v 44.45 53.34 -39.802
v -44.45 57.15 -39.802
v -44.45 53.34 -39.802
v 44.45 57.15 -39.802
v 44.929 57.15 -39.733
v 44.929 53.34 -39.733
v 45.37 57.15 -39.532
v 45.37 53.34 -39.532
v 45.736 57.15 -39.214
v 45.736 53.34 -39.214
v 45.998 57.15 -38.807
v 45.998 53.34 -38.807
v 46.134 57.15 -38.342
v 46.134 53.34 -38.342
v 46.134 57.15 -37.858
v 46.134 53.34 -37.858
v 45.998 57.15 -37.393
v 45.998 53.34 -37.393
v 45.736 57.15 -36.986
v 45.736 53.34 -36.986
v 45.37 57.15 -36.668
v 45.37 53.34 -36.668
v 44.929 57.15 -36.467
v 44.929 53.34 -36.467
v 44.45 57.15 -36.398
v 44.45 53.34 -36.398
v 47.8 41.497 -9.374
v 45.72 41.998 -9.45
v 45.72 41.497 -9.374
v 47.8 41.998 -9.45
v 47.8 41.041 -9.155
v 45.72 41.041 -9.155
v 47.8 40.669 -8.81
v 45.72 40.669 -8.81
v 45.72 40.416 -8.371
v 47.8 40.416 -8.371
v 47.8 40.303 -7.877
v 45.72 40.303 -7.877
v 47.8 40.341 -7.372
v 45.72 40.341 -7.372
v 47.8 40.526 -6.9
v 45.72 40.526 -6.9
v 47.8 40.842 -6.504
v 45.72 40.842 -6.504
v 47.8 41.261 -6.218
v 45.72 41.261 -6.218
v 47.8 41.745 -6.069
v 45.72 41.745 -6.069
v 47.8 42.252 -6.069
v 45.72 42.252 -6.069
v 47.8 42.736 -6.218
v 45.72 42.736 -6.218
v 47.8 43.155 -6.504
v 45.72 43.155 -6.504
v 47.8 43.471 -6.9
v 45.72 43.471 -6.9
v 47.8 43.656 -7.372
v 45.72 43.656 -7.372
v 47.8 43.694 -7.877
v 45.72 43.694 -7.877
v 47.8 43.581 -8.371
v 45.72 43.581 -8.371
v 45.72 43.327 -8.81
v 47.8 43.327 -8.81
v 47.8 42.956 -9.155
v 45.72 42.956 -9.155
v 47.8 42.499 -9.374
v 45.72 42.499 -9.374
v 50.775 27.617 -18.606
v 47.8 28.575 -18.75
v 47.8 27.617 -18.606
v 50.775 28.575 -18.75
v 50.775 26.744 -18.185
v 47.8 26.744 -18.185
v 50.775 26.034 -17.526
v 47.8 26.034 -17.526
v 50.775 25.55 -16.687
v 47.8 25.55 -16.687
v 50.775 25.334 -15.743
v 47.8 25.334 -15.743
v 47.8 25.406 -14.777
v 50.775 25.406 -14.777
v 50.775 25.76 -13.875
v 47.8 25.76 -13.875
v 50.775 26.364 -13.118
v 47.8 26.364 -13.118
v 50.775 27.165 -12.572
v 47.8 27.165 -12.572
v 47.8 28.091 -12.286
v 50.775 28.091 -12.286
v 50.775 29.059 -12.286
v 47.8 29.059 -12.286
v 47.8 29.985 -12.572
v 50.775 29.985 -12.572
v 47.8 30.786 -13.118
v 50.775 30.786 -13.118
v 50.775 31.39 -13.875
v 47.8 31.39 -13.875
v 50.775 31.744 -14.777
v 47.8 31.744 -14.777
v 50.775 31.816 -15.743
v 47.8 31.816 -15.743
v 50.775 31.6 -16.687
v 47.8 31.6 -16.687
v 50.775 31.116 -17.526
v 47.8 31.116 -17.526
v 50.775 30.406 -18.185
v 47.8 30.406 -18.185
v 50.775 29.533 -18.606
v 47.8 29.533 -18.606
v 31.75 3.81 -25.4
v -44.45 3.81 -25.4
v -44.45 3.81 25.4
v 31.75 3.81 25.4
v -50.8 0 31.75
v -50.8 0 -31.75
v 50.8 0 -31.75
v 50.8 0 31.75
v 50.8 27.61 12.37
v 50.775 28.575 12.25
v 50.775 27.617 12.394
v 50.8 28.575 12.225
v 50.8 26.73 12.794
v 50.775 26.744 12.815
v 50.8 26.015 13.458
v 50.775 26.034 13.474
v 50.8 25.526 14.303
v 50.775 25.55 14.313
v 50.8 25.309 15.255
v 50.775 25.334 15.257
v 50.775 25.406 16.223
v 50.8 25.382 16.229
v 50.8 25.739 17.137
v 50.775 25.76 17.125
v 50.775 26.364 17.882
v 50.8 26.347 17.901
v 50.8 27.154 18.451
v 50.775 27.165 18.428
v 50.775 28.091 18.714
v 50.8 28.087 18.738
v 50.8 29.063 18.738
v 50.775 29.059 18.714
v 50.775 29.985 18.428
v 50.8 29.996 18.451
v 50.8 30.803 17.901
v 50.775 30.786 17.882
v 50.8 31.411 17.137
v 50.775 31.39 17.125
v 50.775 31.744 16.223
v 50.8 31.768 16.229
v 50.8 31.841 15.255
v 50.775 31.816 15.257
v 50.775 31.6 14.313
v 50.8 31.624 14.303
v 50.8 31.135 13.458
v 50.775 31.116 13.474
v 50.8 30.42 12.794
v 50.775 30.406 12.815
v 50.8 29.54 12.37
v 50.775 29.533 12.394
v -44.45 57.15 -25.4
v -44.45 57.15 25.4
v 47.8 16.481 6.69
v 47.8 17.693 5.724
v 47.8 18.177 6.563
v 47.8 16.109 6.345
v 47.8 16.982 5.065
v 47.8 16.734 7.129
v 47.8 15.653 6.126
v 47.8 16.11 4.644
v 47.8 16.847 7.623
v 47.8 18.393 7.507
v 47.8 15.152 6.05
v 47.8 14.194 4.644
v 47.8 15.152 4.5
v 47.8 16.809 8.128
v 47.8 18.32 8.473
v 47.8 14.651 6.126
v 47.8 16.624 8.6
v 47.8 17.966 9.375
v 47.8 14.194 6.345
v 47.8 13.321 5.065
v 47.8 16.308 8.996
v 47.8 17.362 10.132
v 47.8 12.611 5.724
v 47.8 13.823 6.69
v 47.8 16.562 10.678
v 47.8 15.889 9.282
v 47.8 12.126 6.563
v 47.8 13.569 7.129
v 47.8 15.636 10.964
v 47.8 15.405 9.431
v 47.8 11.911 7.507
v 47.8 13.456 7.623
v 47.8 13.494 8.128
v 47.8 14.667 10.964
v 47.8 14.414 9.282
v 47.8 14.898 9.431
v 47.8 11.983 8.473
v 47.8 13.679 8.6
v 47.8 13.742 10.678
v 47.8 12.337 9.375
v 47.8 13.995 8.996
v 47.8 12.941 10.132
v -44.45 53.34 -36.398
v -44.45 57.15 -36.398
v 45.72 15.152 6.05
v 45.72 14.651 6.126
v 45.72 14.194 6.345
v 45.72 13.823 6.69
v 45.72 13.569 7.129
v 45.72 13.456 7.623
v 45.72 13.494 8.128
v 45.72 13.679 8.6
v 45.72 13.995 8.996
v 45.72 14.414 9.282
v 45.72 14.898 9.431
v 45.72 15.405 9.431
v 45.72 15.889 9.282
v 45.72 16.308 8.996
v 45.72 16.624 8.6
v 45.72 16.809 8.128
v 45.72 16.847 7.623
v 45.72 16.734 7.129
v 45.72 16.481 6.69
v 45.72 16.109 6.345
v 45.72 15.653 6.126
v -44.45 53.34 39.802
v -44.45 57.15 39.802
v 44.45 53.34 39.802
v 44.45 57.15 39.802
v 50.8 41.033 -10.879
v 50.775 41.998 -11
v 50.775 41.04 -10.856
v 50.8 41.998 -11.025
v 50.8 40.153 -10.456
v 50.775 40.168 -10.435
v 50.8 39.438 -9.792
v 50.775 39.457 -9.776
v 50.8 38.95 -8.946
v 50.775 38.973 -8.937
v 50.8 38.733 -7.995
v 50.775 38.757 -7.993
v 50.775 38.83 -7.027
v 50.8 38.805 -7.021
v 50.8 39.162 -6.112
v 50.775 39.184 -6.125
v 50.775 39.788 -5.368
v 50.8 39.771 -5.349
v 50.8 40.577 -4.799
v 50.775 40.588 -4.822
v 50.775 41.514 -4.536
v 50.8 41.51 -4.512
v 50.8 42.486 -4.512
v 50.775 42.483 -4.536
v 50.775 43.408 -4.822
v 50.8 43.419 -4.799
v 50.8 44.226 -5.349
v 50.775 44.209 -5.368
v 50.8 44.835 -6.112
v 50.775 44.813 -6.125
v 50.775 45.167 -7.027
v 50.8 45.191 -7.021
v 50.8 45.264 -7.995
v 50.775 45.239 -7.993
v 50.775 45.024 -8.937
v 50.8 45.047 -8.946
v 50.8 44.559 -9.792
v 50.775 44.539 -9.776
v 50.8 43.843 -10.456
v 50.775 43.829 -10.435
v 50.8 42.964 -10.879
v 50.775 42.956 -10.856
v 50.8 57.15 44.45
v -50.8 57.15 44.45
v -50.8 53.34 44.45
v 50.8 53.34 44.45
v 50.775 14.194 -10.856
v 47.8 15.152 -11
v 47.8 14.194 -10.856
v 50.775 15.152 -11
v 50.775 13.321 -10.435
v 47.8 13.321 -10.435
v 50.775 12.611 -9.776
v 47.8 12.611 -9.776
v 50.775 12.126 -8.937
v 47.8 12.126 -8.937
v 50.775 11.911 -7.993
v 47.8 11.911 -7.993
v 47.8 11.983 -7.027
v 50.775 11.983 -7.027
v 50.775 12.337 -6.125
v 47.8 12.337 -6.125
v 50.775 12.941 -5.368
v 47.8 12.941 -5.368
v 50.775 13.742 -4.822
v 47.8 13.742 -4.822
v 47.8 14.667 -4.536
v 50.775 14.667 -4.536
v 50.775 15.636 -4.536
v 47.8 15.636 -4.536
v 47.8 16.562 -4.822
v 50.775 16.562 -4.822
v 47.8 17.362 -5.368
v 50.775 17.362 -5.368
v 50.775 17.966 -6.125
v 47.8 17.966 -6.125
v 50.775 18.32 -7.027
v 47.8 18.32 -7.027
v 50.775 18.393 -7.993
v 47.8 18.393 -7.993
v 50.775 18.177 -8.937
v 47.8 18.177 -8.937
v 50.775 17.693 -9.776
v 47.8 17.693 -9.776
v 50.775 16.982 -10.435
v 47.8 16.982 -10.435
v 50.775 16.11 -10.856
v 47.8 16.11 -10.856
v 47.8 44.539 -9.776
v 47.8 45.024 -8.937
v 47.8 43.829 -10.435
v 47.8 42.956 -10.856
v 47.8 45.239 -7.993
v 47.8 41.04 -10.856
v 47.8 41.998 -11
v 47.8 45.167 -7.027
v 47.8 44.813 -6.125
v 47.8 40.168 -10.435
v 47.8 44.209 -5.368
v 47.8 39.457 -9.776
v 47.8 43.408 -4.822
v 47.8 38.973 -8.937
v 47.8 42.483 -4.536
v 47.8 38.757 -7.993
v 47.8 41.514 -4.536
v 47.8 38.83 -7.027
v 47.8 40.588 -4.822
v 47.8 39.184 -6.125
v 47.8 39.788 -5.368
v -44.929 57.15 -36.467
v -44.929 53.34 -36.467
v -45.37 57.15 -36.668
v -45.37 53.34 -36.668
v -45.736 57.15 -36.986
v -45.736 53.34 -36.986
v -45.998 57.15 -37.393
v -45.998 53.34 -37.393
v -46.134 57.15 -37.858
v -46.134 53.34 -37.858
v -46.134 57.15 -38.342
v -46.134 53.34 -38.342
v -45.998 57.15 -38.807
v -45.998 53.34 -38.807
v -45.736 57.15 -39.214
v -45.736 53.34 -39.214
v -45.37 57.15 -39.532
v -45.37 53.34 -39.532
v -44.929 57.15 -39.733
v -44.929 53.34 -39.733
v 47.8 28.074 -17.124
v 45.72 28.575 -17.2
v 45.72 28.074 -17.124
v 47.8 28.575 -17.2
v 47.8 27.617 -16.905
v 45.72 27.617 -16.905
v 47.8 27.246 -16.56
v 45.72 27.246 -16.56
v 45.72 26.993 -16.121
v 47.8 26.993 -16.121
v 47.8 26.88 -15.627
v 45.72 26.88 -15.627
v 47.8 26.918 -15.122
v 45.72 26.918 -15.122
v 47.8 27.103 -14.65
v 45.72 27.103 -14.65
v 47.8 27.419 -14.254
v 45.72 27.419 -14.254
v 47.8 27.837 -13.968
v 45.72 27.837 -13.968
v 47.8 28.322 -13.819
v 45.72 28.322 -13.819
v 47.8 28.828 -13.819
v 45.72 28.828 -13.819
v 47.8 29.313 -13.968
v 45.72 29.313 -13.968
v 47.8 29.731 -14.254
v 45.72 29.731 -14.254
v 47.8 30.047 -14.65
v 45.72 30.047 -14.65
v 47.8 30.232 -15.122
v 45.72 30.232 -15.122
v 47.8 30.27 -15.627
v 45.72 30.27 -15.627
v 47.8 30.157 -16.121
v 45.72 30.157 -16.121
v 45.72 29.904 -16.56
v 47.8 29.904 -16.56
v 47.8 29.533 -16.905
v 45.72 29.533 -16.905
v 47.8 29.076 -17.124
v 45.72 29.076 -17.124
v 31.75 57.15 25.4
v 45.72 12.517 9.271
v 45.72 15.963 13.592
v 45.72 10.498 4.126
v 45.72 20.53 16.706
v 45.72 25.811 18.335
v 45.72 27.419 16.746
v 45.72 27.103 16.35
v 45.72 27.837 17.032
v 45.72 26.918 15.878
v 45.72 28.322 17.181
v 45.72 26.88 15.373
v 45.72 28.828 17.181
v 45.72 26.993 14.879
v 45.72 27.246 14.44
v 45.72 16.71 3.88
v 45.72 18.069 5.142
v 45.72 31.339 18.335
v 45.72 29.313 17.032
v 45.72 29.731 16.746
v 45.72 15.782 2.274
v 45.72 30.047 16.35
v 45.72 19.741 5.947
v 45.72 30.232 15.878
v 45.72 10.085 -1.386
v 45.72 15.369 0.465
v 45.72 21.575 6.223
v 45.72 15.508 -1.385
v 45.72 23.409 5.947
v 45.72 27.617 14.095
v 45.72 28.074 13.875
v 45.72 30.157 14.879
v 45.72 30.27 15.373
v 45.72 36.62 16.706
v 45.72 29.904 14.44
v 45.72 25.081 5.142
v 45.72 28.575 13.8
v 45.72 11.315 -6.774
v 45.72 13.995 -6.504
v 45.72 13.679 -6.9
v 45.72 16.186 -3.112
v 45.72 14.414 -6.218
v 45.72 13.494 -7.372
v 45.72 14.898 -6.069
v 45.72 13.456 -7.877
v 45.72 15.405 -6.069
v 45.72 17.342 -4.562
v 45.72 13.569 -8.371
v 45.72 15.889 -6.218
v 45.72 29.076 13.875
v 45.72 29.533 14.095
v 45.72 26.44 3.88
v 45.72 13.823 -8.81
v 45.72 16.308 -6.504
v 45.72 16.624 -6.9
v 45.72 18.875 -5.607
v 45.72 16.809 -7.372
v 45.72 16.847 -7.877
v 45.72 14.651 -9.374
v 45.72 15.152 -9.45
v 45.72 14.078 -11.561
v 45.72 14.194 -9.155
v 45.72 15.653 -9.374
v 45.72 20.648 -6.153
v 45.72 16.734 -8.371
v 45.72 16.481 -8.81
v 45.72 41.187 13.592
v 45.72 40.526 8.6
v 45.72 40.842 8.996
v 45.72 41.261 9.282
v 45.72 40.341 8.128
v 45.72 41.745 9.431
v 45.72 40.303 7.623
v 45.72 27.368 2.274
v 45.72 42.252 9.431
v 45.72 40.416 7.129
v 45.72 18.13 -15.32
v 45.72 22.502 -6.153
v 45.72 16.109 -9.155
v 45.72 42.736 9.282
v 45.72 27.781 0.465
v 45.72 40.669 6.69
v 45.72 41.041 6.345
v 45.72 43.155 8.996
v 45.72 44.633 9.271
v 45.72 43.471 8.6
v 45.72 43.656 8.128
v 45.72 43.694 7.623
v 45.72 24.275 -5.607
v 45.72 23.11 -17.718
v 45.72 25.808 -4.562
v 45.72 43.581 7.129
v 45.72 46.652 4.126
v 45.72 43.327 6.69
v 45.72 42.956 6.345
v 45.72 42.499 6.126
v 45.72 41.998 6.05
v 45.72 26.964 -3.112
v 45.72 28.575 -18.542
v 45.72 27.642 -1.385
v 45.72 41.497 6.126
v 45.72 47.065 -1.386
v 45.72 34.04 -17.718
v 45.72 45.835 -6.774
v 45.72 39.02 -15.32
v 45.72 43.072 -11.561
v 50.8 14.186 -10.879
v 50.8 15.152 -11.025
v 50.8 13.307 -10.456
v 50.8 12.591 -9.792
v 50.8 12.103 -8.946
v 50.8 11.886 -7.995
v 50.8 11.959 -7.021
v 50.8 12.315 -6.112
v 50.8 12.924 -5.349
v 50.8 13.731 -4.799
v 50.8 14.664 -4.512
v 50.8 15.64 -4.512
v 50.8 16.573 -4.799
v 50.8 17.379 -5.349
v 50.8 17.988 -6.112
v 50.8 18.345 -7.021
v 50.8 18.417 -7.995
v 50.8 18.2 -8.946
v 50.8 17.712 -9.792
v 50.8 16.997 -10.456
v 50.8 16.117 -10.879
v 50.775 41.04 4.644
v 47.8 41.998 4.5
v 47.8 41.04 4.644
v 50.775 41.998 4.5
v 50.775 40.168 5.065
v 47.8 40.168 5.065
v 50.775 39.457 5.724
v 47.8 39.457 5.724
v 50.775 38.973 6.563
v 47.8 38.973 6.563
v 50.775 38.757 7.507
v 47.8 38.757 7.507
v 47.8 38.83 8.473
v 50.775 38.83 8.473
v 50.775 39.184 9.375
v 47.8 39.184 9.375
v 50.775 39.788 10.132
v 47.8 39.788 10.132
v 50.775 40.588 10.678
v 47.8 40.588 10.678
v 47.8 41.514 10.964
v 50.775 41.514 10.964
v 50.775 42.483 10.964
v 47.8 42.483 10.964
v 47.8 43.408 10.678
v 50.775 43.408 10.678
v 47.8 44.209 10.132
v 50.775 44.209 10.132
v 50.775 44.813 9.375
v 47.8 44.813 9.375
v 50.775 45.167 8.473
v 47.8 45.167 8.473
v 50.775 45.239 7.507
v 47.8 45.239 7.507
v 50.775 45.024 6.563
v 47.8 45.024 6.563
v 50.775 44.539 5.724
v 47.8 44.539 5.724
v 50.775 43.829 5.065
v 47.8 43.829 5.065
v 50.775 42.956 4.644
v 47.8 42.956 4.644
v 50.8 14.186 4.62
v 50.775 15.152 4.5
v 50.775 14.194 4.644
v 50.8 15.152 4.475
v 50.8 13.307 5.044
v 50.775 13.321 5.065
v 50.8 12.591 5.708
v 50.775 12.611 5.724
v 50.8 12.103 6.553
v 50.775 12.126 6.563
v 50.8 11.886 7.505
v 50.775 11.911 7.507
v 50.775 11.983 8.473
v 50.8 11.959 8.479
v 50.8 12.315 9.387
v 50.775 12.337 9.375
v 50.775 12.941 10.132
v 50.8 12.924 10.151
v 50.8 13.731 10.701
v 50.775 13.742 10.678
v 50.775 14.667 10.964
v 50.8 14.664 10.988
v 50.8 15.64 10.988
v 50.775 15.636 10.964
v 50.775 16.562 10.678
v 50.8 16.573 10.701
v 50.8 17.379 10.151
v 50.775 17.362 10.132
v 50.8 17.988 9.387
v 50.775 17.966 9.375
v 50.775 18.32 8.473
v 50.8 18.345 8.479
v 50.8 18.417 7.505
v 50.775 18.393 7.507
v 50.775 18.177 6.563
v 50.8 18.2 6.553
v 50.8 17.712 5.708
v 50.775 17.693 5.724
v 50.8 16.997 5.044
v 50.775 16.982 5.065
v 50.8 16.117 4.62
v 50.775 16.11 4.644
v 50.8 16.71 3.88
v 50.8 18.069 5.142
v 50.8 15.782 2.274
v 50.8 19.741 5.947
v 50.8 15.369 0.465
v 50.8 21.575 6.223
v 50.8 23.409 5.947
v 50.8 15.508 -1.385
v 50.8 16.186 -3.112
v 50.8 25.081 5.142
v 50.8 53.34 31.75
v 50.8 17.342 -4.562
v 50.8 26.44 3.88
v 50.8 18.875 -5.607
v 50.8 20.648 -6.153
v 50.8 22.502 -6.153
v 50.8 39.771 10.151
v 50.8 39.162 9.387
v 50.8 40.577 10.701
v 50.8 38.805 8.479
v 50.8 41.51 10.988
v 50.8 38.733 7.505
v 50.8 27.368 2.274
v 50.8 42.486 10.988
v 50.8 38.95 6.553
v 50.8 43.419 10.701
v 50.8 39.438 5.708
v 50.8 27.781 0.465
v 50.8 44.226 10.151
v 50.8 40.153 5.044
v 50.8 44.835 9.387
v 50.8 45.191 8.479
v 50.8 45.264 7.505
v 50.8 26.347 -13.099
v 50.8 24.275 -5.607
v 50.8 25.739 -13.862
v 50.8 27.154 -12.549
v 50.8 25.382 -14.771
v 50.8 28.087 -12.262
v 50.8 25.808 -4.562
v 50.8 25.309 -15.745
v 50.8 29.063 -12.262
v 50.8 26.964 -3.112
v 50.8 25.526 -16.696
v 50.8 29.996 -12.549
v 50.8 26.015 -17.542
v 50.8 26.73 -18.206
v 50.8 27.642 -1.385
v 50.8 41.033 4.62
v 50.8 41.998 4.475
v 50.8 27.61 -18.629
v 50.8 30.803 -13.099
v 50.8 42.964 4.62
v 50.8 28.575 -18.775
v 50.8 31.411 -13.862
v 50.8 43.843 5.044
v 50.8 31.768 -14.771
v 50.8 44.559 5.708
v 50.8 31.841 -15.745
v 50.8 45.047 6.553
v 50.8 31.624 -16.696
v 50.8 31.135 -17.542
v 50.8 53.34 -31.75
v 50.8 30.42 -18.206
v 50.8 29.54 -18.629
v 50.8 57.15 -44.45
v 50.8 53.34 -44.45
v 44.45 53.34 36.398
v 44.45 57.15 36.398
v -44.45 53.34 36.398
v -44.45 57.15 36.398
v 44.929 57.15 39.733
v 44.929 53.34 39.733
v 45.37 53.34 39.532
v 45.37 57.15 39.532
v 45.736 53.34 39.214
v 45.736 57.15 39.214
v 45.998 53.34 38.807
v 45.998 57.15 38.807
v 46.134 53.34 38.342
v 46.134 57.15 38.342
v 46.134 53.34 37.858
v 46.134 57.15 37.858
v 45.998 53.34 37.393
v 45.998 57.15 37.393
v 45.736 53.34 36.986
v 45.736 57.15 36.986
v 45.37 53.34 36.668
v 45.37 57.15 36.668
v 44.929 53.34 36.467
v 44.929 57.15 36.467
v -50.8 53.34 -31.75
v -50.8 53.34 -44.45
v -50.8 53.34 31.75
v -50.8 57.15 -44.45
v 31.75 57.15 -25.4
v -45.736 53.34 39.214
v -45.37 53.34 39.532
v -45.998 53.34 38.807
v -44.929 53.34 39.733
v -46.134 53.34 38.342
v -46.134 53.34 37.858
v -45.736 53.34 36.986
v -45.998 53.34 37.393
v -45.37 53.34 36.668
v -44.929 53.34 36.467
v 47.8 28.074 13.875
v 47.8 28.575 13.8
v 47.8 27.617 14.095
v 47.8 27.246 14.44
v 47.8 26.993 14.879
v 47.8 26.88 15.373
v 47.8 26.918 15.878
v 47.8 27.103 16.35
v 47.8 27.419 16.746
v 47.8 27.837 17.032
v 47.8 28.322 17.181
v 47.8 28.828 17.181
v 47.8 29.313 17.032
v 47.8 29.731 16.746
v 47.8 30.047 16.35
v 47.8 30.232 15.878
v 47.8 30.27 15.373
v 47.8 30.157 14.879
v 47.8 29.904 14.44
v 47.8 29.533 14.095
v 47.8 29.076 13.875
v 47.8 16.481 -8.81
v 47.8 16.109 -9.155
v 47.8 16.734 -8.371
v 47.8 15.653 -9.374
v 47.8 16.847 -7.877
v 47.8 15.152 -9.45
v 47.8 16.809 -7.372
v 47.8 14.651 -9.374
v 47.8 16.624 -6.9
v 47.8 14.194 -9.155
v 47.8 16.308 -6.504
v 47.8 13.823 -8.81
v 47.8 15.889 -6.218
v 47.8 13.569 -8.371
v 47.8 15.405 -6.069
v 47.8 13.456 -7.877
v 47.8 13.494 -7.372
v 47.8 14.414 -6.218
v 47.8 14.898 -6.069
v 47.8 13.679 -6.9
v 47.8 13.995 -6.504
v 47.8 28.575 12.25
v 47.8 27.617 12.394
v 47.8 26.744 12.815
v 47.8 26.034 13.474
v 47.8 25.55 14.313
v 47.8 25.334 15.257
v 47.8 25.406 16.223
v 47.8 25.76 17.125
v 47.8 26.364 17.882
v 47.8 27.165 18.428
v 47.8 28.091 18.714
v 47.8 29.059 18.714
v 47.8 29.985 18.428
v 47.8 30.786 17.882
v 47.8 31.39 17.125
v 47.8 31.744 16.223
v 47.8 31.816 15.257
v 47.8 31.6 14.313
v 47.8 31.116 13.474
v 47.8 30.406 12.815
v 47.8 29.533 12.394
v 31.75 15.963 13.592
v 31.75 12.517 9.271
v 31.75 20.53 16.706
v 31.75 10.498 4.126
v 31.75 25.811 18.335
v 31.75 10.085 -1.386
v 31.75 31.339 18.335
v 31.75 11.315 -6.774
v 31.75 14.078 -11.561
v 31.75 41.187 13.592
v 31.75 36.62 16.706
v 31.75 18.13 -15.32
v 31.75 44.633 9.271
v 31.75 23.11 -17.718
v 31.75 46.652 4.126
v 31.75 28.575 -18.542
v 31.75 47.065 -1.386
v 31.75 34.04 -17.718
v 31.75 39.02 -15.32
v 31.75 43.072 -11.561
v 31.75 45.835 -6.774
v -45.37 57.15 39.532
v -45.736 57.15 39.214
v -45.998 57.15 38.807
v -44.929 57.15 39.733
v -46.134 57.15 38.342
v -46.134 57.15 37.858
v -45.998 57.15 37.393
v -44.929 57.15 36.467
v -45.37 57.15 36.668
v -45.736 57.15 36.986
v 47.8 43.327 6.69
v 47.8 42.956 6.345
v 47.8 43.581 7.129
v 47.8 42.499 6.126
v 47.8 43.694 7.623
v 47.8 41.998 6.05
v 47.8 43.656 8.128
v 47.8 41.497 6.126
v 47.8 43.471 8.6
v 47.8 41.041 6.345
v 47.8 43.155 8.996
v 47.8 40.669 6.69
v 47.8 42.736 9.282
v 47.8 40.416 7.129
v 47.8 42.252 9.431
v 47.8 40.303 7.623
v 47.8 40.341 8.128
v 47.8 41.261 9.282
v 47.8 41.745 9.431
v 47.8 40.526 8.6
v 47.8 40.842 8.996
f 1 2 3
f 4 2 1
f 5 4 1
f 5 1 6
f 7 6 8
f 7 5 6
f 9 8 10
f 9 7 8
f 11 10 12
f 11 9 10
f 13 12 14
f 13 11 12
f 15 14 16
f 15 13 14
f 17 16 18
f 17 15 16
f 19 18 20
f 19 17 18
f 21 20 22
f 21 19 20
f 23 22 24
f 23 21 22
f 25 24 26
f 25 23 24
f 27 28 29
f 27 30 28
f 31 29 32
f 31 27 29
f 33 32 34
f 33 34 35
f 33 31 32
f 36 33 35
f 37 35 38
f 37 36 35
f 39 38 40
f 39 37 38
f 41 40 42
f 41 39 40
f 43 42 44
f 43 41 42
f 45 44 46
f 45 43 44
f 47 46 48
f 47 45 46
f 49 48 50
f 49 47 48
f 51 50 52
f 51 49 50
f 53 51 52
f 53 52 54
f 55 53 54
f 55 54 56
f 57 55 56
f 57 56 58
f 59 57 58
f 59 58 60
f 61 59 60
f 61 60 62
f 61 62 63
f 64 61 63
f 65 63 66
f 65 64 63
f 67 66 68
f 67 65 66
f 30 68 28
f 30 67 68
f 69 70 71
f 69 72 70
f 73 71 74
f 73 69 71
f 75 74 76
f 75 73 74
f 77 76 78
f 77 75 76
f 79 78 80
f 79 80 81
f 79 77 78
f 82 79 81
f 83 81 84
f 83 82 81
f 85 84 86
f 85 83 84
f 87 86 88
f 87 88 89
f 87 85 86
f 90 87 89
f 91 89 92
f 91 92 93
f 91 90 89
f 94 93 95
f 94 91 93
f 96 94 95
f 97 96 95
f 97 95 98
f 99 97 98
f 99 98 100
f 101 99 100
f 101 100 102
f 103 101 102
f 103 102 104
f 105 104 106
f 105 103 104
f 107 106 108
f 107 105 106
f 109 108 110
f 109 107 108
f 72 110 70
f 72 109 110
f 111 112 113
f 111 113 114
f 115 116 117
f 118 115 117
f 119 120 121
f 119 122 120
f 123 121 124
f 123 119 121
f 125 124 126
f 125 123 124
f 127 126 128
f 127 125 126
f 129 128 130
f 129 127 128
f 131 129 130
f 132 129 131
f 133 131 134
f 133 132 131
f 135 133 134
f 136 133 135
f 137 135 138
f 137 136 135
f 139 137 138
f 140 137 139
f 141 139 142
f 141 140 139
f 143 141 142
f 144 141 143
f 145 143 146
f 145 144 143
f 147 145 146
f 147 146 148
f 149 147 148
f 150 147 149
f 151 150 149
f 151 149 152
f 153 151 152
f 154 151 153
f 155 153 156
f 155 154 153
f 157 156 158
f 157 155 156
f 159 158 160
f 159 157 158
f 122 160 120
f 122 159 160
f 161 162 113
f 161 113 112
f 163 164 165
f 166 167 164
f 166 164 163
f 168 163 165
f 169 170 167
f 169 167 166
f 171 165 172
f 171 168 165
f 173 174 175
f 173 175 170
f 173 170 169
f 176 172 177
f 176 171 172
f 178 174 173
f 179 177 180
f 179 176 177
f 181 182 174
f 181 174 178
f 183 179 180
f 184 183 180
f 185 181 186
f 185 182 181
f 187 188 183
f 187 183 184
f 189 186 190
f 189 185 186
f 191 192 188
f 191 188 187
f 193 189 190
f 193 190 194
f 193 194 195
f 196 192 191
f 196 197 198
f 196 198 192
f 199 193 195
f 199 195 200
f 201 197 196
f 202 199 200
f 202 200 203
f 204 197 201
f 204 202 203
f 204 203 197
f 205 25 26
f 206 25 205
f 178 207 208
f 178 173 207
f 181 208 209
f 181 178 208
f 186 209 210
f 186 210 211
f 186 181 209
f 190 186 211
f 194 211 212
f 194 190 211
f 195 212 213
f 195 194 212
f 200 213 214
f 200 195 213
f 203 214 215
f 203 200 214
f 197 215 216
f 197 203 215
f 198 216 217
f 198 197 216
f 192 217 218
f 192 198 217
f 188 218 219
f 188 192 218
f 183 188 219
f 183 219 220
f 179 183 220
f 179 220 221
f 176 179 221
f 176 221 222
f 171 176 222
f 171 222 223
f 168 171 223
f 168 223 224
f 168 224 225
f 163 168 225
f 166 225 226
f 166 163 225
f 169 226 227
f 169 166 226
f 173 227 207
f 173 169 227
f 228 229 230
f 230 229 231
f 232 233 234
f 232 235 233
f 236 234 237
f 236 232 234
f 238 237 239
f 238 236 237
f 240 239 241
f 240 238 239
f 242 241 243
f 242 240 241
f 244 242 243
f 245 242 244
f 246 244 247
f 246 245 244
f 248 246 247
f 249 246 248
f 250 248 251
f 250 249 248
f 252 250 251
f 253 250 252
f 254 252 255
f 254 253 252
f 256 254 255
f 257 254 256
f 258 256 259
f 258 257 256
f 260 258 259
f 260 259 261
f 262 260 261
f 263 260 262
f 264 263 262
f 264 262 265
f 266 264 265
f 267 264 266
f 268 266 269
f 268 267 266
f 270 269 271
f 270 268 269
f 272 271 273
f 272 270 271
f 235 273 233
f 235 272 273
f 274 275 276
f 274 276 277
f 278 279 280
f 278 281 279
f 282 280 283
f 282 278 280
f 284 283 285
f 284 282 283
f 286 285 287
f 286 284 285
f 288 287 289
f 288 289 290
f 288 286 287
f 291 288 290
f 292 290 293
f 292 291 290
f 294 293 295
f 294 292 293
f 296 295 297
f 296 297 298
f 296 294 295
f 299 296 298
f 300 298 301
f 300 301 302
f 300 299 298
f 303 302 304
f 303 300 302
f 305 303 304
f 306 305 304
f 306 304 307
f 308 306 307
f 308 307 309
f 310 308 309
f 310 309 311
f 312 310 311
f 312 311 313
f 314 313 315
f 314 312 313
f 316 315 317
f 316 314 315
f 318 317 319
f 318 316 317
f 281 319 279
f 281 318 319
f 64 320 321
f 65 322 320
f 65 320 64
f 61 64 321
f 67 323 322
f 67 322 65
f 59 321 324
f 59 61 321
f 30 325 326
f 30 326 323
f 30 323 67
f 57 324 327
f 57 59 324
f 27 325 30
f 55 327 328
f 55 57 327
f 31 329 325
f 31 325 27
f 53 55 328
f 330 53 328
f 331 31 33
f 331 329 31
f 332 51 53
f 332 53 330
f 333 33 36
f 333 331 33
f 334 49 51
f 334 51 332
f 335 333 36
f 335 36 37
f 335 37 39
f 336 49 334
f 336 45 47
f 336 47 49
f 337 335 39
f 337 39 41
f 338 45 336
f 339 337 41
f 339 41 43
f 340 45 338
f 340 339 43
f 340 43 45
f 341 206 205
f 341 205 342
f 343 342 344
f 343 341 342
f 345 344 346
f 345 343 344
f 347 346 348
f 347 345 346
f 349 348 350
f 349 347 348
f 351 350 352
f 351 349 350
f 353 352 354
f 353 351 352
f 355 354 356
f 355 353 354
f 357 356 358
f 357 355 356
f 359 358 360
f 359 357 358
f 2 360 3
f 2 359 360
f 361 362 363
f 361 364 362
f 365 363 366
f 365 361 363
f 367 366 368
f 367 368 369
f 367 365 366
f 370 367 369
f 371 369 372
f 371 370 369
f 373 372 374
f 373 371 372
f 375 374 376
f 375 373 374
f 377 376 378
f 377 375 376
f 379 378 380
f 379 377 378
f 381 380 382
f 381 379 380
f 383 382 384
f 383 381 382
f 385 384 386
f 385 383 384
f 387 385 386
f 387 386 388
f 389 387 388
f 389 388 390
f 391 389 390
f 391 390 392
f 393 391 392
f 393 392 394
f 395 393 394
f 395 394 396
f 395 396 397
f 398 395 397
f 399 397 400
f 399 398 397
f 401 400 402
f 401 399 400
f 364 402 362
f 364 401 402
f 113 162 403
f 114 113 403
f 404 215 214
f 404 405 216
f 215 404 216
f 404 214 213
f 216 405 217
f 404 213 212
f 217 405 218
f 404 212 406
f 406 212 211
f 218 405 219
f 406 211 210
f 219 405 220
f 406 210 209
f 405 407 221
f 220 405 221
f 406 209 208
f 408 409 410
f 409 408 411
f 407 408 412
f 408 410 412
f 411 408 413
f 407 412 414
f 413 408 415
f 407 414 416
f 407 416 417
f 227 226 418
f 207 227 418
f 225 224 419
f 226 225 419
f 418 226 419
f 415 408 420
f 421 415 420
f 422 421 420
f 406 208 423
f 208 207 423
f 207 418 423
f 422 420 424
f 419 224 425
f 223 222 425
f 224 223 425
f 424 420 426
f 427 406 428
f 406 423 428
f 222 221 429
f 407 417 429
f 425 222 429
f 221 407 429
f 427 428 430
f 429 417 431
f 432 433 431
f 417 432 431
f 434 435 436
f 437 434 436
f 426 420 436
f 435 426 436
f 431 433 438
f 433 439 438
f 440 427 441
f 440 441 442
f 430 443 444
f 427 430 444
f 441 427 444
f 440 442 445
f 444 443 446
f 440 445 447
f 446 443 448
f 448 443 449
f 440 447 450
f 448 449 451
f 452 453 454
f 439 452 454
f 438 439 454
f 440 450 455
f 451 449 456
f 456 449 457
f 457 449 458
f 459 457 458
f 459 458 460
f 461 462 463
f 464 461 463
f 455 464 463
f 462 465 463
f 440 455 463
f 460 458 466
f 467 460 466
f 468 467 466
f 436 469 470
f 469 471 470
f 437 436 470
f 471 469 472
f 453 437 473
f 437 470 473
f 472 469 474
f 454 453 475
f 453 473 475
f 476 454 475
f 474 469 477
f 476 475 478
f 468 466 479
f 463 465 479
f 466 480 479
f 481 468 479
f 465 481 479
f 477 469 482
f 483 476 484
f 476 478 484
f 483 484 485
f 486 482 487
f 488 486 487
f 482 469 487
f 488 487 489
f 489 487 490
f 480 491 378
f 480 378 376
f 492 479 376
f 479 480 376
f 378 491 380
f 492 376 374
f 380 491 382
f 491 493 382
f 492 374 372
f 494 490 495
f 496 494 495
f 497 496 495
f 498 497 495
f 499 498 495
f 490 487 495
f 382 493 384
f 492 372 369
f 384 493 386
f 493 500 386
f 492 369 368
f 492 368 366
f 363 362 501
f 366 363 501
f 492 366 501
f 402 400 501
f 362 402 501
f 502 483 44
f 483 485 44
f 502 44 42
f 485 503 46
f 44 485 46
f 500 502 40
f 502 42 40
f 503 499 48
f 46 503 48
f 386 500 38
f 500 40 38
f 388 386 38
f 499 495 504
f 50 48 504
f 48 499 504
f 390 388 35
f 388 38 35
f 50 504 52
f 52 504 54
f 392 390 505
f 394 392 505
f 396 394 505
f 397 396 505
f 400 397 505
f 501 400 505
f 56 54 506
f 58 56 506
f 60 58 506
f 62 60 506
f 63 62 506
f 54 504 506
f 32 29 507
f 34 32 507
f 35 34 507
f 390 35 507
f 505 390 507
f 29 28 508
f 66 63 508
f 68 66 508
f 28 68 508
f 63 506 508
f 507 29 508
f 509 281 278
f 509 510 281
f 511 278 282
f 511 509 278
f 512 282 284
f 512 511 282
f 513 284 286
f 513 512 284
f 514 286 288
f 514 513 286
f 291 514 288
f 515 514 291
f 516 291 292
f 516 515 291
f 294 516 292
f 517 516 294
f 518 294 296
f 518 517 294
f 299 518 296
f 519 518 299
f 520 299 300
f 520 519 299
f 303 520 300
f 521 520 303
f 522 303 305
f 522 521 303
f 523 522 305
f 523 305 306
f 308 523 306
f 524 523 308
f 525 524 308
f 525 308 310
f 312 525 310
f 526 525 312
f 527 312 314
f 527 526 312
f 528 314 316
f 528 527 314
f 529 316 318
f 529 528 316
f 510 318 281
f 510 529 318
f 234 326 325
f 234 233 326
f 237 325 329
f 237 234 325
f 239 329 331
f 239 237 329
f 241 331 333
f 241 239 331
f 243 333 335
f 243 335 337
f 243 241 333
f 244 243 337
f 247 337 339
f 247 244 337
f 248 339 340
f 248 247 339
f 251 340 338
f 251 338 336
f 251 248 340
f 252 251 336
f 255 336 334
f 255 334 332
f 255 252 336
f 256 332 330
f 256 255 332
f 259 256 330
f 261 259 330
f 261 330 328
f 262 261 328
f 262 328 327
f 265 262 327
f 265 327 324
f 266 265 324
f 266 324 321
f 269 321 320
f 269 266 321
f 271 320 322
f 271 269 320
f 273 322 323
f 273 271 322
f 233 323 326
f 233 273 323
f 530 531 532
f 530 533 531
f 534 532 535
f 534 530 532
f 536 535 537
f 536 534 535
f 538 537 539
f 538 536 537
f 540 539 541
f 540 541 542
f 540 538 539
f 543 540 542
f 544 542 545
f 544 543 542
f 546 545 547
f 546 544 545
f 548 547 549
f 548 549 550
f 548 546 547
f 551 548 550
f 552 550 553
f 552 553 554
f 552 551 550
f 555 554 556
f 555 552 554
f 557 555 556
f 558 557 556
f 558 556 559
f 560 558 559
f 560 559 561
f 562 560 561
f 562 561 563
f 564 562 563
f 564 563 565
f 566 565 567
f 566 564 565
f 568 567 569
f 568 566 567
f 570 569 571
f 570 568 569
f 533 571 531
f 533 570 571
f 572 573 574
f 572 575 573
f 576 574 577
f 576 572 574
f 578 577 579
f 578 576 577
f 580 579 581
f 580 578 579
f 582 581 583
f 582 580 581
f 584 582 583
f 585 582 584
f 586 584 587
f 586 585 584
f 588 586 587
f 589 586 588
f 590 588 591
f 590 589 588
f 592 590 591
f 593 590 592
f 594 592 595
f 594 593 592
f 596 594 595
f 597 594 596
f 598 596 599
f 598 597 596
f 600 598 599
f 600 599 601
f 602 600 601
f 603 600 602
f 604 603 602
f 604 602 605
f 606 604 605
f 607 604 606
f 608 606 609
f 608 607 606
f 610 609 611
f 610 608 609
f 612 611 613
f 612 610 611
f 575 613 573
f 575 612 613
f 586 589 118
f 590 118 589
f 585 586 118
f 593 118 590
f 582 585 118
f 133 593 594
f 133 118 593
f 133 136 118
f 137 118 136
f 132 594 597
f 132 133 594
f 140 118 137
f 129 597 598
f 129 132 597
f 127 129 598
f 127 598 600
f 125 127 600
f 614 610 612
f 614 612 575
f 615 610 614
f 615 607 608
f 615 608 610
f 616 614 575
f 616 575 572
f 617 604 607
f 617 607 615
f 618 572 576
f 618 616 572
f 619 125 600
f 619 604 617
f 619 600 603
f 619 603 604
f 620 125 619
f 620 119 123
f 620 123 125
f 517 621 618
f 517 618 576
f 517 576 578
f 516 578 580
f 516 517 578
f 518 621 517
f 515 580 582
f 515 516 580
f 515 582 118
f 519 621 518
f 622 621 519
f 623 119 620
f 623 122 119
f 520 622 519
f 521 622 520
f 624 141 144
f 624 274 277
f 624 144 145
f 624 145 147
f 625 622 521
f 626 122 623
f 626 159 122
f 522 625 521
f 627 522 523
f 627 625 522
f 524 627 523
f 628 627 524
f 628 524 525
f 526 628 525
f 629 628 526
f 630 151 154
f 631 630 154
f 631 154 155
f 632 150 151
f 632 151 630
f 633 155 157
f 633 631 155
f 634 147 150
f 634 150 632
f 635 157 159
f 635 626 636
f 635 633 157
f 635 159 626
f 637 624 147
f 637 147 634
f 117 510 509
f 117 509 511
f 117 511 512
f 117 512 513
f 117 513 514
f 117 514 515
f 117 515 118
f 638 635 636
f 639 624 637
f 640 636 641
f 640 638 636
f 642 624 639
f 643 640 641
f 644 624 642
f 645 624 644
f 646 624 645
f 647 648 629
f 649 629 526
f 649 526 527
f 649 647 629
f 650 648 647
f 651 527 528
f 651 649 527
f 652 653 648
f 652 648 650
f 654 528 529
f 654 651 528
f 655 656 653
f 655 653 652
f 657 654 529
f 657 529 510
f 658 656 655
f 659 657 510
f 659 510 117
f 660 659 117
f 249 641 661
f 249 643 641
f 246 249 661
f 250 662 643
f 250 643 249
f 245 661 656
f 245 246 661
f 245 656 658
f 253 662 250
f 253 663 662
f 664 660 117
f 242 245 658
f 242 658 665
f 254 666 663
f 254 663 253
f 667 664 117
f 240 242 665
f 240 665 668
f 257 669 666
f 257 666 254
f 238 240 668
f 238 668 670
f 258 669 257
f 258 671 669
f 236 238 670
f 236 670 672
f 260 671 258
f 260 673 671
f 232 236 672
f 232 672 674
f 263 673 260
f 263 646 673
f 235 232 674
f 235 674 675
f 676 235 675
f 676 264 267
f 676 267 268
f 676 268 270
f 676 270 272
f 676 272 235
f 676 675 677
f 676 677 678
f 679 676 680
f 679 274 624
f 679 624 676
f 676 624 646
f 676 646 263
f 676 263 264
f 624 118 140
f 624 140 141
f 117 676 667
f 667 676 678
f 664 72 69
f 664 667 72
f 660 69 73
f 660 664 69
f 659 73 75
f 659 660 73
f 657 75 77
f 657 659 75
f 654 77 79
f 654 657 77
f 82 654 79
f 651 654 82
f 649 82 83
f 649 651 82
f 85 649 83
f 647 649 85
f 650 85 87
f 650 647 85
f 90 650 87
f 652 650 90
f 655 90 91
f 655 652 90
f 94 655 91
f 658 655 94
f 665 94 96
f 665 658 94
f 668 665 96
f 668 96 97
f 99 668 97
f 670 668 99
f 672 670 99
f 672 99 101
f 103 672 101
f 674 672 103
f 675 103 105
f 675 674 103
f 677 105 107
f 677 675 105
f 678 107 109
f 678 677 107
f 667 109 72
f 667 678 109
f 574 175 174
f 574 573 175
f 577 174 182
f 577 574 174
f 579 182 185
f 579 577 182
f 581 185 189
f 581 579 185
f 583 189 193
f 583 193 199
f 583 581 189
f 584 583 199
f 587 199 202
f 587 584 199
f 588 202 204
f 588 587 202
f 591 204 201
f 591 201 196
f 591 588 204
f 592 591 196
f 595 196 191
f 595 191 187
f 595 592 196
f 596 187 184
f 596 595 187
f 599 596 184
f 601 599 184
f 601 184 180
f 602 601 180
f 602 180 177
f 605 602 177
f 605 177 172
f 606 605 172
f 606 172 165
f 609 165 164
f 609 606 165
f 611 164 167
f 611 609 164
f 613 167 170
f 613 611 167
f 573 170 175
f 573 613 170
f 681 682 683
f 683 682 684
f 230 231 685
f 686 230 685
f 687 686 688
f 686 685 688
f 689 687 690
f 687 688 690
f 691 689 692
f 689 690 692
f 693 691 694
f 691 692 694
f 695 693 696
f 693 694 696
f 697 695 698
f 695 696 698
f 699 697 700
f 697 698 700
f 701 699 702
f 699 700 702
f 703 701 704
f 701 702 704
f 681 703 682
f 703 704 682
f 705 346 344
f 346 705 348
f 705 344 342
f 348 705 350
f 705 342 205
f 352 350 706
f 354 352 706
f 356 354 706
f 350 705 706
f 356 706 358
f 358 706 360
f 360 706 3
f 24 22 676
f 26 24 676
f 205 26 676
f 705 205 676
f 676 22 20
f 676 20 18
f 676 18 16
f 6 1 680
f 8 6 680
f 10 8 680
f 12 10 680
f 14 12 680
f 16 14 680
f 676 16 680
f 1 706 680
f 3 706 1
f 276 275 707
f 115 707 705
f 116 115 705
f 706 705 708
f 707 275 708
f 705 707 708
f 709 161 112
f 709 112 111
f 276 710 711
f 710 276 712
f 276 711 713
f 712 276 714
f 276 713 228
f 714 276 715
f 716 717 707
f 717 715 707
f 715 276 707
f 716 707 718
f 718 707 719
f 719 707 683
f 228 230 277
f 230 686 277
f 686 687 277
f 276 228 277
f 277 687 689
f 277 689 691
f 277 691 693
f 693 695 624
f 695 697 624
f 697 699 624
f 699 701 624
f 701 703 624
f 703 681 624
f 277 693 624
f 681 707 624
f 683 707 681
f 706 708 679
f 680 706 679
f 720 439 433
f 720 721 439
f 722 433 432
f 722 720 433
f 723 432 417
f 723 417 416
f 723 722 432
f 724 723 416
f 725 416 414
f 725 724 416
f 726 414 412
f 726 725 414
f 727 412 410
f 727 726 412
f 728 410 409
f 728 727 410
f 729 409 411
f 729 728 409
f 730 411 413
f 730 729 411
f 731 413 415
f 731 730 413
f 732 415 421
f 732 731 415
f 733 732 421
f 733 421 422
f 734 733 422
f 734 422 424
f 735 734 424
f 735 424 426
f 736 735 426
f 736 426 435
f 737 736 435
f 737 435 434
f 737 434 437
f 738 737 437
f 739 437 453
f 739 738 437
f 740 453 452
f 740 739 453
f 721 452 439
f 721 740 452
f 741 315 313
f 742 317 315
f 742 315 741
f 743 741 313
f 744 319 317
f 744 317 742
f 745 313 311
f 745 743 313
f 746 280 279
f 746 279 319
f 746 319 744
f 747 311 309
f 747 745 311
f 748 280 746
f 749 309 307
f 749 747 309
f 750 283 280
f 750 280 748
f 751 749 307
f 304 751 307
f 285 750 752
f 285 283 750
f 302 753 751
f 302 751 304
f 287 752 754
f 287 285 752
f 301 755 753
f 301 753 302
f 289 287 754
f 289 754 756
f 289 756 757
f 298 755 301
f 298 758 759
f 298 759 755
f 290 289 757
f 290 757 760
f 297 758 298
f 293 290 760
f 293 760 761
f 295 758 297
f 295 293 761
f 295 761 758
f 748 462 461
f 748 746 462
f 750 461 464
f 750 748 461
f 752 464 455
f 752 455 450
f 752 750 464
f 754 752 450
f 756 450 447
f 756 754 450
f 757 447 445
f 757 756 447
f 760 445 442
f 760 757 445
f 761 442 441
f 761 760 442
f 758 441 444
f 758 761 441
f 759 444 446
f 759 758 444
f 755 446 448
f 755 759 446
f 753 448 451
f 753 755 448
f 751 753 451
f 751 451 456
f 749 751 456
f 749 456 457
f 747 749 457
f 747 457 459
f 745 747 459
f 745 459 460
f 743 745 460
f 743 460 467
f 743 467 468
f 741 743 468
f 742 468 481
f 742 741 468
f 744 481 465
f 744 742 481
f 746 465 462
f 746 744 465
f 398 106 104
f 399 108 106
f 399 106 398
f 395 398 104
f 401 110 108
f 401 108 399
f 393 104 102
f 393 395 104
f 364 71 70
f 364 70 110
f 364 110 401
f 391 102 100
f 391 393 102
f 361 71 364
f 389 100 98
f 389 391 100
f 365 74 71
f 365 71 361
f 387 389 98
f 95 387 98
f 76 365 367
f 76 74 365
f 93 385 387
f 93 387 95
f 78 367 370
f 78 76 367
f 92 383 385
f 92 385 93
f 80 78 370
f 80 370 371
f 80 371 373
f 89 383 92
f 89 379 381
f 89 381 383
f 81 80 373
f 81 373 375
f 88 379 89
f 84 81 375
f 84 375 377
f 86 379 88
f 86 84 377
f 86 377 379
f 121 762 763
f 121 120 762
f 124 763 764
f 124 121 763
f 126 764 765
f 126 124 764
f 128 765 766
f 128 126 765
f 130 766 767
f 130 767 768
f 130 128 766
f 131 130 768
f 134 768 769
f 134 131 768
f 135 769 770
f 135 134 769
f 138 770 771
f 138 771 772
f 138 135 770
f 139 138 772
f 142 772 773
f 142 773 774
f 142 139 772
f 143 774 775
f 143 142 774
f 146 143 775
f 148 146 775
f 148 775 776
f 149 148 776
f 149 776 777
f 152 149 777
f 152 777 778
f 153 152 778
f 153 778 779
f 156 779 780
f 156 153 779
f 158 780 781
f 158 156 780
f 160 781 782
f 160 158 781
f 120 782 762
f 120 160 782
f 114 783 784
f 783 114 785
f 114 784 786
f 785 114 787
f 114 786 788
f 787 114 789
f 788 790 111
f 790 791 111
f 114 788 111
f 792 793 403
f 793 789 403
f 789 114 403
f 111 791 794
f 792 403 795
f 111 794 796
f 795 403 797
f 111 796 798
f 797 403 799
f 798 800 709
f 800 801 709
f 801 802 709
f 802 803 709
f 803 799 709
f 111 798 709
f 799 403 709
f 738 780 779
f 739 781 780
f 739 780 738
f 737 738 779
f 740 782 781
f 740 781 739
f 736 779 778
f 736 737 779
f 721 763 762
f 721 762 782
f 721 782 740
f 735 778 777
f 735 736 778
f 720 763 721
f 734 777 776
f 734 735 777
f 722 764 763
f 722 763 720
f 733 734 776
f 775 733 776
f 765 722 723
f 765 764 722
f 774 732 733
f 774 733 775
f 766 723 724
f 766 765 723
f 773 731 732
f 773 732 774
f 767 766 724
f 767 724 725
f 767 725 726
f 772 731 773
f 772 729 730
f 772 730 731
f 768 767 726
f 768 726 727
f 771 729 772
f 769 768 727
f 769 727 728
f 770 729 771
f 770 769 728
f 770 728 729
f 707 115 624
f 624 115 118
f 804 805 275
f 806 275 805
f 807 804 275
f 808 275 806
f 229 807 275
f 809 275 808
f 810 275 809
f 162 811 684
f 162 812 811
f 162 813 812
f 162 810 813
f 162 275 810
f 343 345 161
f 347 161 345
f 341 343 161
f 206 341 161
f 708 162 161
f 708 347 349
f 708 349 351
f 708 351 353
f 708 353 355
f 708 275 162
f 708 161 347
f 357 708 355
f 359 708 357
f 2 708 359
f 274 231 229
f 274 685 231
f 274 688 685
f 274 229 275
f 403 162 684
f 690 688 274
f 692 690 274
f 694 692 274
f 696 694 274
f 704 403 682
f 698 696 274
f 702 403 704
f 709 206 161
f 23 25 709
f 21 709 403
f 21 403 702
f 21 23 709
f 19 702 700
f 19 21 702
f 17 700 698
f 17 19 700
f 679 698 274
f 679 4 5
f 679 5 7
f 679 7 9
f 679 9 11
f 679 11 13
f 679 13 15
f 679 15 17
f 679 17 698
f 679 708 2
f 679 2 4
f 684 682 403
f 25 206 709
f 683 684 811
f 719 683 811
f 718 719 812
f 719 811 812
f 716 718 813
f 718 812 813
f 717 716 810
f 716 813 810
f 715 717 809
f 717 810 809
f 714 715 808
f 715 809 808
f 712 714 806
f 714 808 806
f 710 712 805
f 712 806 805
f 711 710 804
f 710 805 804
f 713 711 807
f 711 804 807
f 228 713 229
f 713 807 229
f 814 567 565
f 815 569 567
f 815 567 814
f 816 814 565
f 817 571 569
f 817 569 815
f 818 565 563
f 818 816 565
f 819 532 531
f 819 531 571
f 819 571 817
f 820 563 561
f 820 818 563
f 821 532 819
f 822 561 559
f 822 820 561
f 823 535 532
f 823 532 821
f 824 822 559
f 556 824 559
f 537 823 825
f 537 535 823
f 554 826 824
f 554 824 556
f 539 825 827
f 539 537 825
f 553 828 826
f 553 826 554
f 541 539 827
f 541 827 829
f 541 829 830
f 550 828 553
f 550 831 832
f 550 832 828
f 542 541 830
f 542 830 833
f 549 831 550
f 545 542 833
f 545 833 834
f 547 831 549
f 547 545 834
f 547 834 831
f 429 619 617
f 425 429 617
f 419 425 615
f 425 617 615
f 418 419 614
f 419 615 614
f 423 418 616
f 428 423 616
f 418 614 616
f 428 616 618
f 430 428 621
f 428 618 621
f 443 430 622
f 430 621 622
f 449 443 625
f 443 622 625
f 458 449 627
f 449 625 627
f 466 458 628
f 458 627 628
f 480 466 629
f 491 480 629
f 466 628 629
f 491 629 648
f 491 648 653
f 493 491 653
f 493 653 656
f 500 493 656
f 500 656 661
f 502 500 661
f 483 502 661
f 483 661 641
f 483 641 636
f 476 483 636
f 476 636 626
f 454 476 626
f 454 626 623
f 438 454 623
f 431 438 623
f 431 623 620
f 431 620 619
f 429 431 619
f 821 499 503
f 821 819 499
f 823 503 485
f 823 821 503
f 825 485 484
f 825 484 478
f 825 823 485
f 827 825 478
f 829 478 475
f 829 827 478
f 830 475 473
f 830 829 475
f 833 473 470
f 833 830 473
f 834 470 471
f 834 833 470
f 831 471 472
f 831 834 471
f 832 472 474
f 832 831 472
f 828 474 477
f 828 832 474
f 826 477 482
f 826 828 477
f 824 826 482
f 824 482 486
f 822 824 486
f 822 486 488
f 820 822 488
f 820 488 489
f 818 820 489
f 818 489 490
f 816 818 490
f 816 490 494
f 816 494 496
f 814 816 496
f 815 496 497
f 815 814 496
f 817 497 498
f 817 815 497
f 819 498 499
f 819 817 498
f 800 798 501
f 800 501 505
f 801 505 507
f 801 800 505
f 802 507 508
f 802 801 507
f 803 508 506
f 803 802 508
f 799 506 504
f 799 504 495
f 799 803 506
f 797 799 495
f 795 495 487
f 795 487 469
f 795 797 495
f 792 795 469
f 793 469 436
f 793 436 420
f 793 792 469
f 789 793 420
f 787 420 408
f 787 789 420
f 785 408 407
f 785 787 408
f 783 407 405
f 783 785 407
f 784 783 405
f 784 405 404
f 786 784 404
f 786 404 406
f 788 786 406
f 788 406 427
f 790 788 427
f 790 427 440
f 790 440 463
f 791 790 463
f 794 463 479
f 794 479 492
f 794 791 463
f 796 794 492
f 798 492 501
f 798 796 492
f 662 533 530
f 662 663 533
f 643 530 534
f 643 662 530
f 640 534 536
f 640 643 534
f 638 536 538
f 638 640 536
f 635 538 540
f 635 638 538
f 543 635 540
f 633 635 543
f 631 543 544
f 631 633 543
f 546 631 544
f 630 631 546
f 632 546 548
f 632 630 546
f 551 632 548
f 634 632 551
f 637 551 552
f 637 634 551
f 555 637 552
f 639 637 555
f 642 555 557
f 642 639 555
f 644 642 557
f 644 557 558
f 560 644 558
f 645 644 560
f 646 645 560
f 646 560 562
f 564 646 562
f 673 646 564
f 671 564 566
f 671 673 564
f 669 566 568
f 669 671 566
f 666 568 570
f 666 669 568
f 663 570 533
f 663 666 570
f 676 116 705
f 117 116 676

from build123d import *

# Parameters (mm, degrees)
SKETCH1_W                     = 101.6
SKETCH1_H                     = 63.5
BOSS_EXTRUDE1_DEPTH           = 57.15
CBORE_FOR_M3_SHCS1_AT_2_COUNT = 2
CBORE_FOR_M3_SHCS1_AT_2_PITCH = 15.499969
CBORE_FOR_M3_SHCS1_AT_3_COUNT = 2
CBORE_FOR_M3_SHCS1_AT_3_PITCH = 26.846733824
CBORE_FOR_M3_SHCS1_AT_4_COUNT = 2
CBORE_FOR_M3_SHCS1_AT_4_PITCH = 30.999938
CBORE_FOR_M3_SHCS1_AT_5_COUNT = 2
CBORE_FOR_M3_SHCS1_AT_5_PITCH = 26.846733824
CBORE_FOR_M3_SHCS1_AT_6_COUNT = 2
CBORE_FOR_M3_SHCS1_AT_6_PITCH = 15.499969
SKETCH8_R                     = 6.223
CUT_EXTRUDE1_DEPTH            = 50.8
SKETCH9_W                     = 76.2
SKETCH9_H                     = 50.8
CUT_EXTRUDE2_DEPTH            = 53.34
CUT_EXTRUDE3_START            = -19.05
SKETCH2_R                     = 18.542
CUT_EXTRUDE3_DEPTH            = 13.97
SKETCH10_W                    = 101.6
SKETCH10_H                    = 12.7
BOSS_EXTRUDE2_DEPTH           = 3.81
CUT_EXTRUDE4_DEPTH            = 3.81


with BuildPart() as part:
    # Sketch1 → Boss-Extrude1 (new body)
    with BuildSketch(Plane(origin=(0, 0, 0), x_dir=(1, 0, 0), z_dir=(0, 1, 0))):
        Rectangle(SKETCH1_W, SKETCH1_H)
    extrude(amount=BOSS_EXTRUDE1_DEPTH)

    # Sketch6 → CBORE for M3 SHCS1 (revolve, cut)
    with BuildSketch(Plane(origin=(50.8, 41.998366912, 7.7499845), x_dir=(0, 0, -1), z_dir=(0, 1, 0))):
        Polygon((0, 0), (0, 6.101463052), (1.7, 5.08), (1.7, 3), (3.25, 3), (3.25, 0.025), (3.275, 0), align=None)
    cbore_for_m3_shcs1 = revolve(axis=Axis((57.15, 41.998366912, 7.7499845), (-1, 0, 0)), mode=Mode.SUBTRACT)

    # CBORE for M3 SHCS1 at 2: CBORE for M3 SHCS1 ×2
    with Locations(*[Vector(0, -0.866025404, 0.5) * (i * CBORE_FOR_M3_SHCS1_AT_2_PITCH) for i in range(1, CBORE_FOR_M3_SHCS1_AT_2_COUNT)]):
        add(cbore_for_m3_shcs1, mode=Mode.SUBTRACT)

    # CBORE for M3 SHCS1 at 3: CBORE for M3 SHCS1 ×2
    with Locations(*[(0, -i * CBORE_FOR_M3_SHCS1_AT_3_PITCH, 0) for i in range(1, CBORE_FOR_M3_SHCS1_AT_3_COUNT)]):
        add(cbore_for_m3_shcs1, mode=Mode.SUBTRACT)

    # CBORE for M3 SHCS1 at 4: CBORE for M3 SHCS1 ×2
    with Locations(*[Vector(0, -0.866025404, -0.5) * (i * CBORE_FOR_M3_SHCS1_AT_4_PITCH) for i in range(1, CBORE_FOR_M3_SHCS1_AT_4_COUNT)]):
        add(cbore_for_m3_shcs1, mode=Mode.SUBTRACT)

    # CBORE for M3 SHCS1 at 5: CBORE for M3 SHCS1 ×2
    with Locations(*[Vector(0, -0.5, -0.866025404) * (i * CBORE_FOR_M3_SHCS1_AT_5_PITCH) for i in range(1, CBORE_FOR_M3_SHCS1_AT_5_COUNT)]):
        add(cbore_for_m3_shcs1, mode=Mode.SUBTRACT)

    # CBORE for M3 SHCS1 at 6: CBORE for M3 SHCS1 ×2
    with Locations(*[(0, 0, -i * CBORE_FOR_M3_SHCS1_AT_6_PITCH) for i in range(1, CBORE_FOR_M3_SHCS1_AT_6_COUNT)]):
        add(cbore_for_m3_shcs1, mode=Mode.SUBTRACT)

    # Sketch8 → Cut-Extrude1 (cut)
    with BuildSketch(Plane(origin=(50.8, 29.820388237, 44.133609073), x_dir=(0, 0, 1), z_dir=(1, 0, 0))):
        with Locations((-44.133609073, 8.245386937)):
            Circle(SKETCH8_R)
    extrude(amount=-CUT_EXTRUDE1_DEPTH, mode=Mode.SUBTRACT)

    # Sketch9 → Cut-Extrude2 (cut)
    with BuildSketch(Plane(origin=(0, 57.15, 0), x_dir=(1, 0, 0), z_dir=(0, 1, 0))):
        with Locations((-6.35, 0)):
            Rectangle(SKETCH9_W, SKETCH9_H)
    extrude(amount=-CUT_EXTRUDE2_DEPTH, mode=Mode.SUBTRACT)

    # Sketch2 → Cut-Extrude3 (cut)
    with BuildSketch(Plane(origin=(50.8, 29.820388237, 50.894246884), x_dir=(0, 0, -1), z_dir=(1, 0, 0)).offset(CUT_EXTRUDE3_START)):
        with Locations((50.894246884, -1.245388237)):
            Circle(SKETCH2_R)
    extrude(amount=CUT_EXTRUDE3_DEPTH, mode=Mode.SUBTRACT)

    # Sketch10 → Boss-Extrude2 (add)
    with BuildSketch(Plane(origin=(0, 57.15, 0), x_dir=(1, 0, 0), z_dir=(0, 1, 0))):
        with Locations((0, 38.1)):
            Rectangle(SKETCH10_W, SKETCH10_H)
        with Locations((0, -38.1)):
            Rectangle(SKETCH10_W, SKETCH10_H)
    extrude(amount=-BOSS_EXTRUDE2_DEPTH)

    # Sketch11 → Cut-Extrude4 (cut)
    with BuildSketch(Plane(origin=(0, 57.15, 0), x_dir=(1, 0, 0), z_dir=(0, 1, 0))):
        with BuildLine():
            Line((-44.45, 39.8018), (44.45, 39.8018))
            ThreePointArc((44.45, 39.8018), (46.1518, 38.1), (44.45, 36.3982))
            Line((44.45, 36.3982), (-44.45, 36.3982))
            ThreePointArc((-44.45, 36.3982), (-46.1518, 38.1), (-44.45, 39.8018))
        make_face()
        with BuildLine():
            Line((-44.45, -39.8018), (44.45, -39.8018))
            ThreePointArc((44.45, -39.8018), (46.1518, -38.1), (44.45, -36.3982))
            Line((44.45, -36.3982), (-44.45, -36.3982))
            ThreePointArc((-44.45, -36.3982), (-46.1518, -38.1), (-44.45, -39.8018))
        make_face()
    extrude(amount=-CUT_EXTRUDE4_DEPTH, mode=Mode.SUBTRACT)


solid = part.part
